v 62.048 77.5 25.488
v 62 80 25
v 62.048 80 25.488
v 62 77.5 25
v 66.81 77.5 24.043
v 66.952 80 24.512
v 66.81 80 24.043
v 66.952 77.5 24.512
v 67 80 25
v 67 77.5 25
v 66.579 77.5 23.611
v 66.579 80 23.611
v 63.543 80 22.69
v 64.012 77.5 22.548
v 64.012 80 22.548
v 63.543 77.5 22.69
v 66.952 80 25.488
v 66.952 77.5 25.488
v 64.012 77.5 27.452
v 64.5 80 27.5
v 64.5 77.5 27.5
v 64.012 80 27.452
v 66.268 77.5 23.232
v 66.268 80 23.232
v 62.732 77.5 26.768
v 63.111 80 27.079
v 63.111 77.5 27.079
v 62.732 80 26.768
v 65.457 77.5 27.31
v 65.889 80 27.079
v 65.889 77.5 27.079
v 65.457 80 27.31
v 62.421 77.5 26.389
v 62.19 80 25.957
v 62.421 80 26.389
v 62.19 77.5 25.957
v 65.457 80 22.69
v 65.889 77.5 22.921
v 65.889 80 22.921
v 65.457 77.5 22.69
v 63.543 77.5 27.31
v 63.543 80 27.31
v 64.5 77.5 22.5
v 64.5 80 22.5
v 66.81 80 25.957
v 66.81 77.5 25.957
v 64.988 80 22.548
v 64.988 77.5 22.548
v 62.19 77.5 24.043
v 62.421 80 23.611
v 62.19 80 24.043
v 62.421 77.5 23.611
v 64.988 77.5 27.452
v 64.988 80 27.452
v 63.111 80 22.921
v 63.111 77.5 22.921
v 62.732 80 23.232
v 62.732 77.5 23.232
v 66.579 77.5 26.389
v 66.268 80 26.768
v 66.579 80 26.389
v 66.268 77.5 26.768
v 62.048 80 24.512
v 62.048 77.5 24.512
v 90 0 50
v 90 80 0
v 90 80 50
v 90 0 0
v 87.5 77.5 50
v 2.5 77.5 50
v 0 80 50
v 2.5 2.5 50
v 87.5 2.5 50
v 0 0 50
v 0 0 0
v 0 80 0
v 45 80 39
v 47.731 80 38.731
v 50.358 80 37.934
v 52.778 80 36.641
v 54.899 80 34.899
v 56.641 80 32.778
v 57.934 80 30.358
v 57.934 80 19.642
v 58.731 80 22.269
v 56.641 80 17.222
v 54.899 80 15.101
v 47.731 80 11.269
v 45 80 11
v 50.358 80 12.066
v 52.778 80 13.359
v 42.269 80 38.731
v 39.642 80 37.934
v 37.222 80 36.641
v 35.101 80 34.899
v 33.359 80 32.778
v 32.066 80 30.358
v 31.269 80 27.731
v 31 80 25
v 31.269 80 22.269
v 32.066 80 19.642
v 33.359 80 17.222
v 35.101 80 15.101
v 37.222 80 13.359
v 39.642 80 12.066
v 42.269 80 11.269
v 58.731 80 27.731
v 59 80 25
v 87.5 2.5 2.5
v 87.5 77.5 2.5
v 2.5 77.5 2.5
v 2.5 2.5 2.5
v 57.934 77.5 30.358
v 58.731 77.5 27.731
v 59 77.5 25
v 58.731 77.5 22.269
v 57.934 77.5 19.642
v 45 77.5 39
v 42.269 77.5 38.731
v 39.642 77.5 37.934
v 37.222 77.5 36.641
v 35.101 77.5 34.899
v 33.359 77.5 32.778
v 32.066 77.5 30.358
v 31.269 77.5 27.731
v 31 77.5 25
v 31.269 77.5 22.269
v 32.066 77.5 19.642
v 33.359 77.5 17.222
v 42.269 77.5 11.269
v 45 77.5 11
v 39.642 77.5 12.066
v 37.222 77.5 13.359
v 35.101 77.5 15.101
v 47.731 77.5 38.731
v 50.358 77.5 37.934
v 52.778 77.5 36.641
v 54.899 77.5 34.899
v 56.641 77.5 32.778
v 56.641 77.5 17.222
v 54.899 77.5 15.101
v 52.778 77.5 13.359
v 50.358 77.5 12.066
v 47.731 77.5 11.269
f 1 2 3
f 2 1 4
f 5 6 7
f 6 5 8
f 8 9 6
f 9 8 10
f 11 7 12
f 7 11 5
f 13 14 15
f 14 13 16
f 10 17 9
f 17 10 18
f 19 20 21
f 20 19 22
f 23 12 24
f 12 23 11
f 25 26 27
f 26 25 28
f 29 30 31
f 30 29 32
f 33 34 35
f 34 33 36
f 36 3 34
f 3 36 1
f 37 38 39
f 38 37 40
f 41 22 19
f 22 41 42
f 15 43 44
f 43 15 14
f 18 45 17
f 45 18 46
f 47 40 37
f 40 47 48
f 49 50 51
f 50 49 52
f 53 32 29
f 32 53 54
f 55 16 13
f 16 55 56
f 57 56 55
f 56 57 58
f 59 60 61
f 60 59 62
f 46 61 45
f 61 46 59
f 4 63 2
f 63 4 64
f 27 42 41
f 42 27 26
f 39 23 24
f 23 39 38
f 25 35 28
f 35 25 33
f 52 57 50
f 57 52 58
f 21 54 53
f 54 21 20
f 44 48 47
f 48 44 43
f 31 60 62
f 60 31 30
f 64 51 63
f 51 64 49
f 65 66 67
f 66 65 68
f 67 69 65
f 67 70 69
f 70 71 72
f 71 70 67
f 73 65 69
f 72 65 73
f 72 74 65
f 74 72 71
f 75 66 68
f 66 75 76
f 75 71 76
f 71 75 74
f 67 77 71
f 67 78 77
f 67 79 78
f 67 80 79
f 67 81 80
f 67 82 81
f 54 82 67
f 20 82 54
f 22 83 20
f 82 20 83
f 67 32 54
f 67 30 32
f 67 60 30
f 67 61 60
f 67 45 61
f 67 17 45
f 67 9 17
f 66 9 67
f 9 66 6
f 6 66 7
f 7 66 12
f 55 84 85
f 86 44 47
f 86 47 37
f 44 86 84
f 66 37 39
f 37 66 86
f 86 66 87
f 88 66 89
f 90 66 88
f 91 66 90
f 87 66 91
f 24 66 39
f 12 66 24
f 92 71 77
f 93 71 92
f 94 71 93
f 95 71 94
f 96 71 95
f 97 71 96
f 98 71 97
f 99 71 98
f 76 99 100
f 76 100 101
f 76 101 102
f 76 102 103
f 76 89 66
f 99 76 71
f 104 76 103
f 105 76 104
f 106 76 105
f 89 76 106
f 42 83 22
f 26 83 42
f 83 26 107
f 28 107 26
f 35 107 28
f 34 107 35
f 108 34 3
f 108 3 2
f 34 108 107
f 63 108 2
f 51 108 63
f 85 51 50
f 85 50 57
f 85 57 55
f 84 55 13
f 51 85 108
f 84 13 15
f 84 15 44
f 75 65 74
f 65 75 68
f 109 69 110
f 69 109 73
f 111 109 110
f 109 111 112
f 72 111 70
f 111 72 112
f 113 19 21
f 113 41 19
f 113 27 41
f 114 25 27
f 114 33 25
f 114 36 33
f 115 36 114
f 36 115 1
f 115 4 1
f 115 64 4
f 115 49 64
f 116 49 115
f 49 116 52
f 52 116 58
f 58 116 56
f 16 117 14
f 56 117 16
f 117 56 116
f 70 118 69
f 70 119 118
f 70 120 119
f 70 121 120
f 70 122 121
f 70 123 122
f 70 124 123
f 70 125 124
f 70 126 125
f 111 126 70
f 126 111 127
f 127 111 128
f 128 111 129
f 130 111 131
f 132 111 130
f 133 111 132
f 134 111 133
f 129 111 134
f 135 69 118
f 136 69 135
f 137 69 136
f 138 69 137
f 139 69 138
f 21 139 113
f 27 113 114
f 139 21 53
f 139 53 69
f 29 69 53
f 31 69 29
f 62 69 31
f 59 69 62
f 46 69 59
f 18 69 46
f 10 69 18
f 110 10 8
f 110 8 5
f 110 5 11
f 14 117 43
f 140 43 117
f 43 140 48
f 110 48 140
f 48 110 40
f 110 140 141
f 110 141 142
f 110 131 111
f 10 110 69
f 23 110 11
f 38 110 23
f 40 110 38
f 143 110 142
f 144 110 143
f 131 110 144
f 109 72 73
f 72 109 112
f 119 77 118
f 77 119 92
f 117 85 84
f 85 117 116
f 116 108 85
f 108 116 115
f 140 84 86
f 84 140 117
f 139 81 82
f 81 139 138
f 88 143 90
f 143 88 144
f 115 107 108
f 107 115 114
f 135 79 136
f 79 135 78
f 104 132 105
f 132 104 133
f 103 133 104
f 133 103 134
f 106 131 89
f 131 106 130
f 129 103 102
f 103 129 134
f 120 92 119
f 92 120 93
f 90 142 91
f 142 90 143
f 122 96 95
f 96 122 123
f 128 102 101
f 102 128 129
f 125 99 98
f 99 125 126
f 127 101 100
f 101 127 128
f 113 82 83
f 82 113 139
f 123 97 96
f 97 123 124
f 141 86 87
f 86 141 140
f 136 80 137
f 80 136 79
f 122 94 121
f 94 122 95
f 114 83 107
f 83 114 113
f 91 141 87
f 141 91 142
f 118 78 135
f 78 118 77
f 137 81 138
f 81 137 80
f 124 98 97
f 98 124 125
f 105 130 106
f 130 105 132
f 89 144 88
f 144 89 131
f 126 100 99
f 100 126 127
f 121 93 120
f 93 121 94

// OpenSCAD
$fn = 32;

// ----------------------------------------------------------------------
// Vent box: roundvent enclosure
// ----------------------------------------------------------------------

// --- parameters (mm) ---
box_l = 90;               // box length, X
box_w = 80;               // box width, Y
box_h = 50;               // box height, Z
wall_t = 2.5;             // shell wall thickness
vent_d = 28;              // central vent diameter
ring_d = 5;               // ring hole diameter
n_ring = 6;               // holes in the ring
ring_r = 19.5;            // ring radius

ring_step = 360 / n_ring;  // ring hole angular step

difference() {
  cube([box_l, box_w, box_h]);
  translate([wall_t, wall_t, wall_t])
    cube([box_l - 2 * wall_t, box_w - 2 * wall_t, box_h]);
  translate([box_l / 2, box_w - wall_t - 1, box_h / 2])
    rotate([-90, 0, 0]) cylinder(h = wall_t + 2, d = vent_d);
  for (i = [0 : n_ring - 1])
    translate([box_l / 2, box_w - wall_t - 1, box_h / 2])
      rotate([0, 0, i * ring_step])
        translate([ring_r, 0, 0]) rotate([-90, 0, 0])
          cylinder(h = wall_t + 2, d = ring_d);
}
